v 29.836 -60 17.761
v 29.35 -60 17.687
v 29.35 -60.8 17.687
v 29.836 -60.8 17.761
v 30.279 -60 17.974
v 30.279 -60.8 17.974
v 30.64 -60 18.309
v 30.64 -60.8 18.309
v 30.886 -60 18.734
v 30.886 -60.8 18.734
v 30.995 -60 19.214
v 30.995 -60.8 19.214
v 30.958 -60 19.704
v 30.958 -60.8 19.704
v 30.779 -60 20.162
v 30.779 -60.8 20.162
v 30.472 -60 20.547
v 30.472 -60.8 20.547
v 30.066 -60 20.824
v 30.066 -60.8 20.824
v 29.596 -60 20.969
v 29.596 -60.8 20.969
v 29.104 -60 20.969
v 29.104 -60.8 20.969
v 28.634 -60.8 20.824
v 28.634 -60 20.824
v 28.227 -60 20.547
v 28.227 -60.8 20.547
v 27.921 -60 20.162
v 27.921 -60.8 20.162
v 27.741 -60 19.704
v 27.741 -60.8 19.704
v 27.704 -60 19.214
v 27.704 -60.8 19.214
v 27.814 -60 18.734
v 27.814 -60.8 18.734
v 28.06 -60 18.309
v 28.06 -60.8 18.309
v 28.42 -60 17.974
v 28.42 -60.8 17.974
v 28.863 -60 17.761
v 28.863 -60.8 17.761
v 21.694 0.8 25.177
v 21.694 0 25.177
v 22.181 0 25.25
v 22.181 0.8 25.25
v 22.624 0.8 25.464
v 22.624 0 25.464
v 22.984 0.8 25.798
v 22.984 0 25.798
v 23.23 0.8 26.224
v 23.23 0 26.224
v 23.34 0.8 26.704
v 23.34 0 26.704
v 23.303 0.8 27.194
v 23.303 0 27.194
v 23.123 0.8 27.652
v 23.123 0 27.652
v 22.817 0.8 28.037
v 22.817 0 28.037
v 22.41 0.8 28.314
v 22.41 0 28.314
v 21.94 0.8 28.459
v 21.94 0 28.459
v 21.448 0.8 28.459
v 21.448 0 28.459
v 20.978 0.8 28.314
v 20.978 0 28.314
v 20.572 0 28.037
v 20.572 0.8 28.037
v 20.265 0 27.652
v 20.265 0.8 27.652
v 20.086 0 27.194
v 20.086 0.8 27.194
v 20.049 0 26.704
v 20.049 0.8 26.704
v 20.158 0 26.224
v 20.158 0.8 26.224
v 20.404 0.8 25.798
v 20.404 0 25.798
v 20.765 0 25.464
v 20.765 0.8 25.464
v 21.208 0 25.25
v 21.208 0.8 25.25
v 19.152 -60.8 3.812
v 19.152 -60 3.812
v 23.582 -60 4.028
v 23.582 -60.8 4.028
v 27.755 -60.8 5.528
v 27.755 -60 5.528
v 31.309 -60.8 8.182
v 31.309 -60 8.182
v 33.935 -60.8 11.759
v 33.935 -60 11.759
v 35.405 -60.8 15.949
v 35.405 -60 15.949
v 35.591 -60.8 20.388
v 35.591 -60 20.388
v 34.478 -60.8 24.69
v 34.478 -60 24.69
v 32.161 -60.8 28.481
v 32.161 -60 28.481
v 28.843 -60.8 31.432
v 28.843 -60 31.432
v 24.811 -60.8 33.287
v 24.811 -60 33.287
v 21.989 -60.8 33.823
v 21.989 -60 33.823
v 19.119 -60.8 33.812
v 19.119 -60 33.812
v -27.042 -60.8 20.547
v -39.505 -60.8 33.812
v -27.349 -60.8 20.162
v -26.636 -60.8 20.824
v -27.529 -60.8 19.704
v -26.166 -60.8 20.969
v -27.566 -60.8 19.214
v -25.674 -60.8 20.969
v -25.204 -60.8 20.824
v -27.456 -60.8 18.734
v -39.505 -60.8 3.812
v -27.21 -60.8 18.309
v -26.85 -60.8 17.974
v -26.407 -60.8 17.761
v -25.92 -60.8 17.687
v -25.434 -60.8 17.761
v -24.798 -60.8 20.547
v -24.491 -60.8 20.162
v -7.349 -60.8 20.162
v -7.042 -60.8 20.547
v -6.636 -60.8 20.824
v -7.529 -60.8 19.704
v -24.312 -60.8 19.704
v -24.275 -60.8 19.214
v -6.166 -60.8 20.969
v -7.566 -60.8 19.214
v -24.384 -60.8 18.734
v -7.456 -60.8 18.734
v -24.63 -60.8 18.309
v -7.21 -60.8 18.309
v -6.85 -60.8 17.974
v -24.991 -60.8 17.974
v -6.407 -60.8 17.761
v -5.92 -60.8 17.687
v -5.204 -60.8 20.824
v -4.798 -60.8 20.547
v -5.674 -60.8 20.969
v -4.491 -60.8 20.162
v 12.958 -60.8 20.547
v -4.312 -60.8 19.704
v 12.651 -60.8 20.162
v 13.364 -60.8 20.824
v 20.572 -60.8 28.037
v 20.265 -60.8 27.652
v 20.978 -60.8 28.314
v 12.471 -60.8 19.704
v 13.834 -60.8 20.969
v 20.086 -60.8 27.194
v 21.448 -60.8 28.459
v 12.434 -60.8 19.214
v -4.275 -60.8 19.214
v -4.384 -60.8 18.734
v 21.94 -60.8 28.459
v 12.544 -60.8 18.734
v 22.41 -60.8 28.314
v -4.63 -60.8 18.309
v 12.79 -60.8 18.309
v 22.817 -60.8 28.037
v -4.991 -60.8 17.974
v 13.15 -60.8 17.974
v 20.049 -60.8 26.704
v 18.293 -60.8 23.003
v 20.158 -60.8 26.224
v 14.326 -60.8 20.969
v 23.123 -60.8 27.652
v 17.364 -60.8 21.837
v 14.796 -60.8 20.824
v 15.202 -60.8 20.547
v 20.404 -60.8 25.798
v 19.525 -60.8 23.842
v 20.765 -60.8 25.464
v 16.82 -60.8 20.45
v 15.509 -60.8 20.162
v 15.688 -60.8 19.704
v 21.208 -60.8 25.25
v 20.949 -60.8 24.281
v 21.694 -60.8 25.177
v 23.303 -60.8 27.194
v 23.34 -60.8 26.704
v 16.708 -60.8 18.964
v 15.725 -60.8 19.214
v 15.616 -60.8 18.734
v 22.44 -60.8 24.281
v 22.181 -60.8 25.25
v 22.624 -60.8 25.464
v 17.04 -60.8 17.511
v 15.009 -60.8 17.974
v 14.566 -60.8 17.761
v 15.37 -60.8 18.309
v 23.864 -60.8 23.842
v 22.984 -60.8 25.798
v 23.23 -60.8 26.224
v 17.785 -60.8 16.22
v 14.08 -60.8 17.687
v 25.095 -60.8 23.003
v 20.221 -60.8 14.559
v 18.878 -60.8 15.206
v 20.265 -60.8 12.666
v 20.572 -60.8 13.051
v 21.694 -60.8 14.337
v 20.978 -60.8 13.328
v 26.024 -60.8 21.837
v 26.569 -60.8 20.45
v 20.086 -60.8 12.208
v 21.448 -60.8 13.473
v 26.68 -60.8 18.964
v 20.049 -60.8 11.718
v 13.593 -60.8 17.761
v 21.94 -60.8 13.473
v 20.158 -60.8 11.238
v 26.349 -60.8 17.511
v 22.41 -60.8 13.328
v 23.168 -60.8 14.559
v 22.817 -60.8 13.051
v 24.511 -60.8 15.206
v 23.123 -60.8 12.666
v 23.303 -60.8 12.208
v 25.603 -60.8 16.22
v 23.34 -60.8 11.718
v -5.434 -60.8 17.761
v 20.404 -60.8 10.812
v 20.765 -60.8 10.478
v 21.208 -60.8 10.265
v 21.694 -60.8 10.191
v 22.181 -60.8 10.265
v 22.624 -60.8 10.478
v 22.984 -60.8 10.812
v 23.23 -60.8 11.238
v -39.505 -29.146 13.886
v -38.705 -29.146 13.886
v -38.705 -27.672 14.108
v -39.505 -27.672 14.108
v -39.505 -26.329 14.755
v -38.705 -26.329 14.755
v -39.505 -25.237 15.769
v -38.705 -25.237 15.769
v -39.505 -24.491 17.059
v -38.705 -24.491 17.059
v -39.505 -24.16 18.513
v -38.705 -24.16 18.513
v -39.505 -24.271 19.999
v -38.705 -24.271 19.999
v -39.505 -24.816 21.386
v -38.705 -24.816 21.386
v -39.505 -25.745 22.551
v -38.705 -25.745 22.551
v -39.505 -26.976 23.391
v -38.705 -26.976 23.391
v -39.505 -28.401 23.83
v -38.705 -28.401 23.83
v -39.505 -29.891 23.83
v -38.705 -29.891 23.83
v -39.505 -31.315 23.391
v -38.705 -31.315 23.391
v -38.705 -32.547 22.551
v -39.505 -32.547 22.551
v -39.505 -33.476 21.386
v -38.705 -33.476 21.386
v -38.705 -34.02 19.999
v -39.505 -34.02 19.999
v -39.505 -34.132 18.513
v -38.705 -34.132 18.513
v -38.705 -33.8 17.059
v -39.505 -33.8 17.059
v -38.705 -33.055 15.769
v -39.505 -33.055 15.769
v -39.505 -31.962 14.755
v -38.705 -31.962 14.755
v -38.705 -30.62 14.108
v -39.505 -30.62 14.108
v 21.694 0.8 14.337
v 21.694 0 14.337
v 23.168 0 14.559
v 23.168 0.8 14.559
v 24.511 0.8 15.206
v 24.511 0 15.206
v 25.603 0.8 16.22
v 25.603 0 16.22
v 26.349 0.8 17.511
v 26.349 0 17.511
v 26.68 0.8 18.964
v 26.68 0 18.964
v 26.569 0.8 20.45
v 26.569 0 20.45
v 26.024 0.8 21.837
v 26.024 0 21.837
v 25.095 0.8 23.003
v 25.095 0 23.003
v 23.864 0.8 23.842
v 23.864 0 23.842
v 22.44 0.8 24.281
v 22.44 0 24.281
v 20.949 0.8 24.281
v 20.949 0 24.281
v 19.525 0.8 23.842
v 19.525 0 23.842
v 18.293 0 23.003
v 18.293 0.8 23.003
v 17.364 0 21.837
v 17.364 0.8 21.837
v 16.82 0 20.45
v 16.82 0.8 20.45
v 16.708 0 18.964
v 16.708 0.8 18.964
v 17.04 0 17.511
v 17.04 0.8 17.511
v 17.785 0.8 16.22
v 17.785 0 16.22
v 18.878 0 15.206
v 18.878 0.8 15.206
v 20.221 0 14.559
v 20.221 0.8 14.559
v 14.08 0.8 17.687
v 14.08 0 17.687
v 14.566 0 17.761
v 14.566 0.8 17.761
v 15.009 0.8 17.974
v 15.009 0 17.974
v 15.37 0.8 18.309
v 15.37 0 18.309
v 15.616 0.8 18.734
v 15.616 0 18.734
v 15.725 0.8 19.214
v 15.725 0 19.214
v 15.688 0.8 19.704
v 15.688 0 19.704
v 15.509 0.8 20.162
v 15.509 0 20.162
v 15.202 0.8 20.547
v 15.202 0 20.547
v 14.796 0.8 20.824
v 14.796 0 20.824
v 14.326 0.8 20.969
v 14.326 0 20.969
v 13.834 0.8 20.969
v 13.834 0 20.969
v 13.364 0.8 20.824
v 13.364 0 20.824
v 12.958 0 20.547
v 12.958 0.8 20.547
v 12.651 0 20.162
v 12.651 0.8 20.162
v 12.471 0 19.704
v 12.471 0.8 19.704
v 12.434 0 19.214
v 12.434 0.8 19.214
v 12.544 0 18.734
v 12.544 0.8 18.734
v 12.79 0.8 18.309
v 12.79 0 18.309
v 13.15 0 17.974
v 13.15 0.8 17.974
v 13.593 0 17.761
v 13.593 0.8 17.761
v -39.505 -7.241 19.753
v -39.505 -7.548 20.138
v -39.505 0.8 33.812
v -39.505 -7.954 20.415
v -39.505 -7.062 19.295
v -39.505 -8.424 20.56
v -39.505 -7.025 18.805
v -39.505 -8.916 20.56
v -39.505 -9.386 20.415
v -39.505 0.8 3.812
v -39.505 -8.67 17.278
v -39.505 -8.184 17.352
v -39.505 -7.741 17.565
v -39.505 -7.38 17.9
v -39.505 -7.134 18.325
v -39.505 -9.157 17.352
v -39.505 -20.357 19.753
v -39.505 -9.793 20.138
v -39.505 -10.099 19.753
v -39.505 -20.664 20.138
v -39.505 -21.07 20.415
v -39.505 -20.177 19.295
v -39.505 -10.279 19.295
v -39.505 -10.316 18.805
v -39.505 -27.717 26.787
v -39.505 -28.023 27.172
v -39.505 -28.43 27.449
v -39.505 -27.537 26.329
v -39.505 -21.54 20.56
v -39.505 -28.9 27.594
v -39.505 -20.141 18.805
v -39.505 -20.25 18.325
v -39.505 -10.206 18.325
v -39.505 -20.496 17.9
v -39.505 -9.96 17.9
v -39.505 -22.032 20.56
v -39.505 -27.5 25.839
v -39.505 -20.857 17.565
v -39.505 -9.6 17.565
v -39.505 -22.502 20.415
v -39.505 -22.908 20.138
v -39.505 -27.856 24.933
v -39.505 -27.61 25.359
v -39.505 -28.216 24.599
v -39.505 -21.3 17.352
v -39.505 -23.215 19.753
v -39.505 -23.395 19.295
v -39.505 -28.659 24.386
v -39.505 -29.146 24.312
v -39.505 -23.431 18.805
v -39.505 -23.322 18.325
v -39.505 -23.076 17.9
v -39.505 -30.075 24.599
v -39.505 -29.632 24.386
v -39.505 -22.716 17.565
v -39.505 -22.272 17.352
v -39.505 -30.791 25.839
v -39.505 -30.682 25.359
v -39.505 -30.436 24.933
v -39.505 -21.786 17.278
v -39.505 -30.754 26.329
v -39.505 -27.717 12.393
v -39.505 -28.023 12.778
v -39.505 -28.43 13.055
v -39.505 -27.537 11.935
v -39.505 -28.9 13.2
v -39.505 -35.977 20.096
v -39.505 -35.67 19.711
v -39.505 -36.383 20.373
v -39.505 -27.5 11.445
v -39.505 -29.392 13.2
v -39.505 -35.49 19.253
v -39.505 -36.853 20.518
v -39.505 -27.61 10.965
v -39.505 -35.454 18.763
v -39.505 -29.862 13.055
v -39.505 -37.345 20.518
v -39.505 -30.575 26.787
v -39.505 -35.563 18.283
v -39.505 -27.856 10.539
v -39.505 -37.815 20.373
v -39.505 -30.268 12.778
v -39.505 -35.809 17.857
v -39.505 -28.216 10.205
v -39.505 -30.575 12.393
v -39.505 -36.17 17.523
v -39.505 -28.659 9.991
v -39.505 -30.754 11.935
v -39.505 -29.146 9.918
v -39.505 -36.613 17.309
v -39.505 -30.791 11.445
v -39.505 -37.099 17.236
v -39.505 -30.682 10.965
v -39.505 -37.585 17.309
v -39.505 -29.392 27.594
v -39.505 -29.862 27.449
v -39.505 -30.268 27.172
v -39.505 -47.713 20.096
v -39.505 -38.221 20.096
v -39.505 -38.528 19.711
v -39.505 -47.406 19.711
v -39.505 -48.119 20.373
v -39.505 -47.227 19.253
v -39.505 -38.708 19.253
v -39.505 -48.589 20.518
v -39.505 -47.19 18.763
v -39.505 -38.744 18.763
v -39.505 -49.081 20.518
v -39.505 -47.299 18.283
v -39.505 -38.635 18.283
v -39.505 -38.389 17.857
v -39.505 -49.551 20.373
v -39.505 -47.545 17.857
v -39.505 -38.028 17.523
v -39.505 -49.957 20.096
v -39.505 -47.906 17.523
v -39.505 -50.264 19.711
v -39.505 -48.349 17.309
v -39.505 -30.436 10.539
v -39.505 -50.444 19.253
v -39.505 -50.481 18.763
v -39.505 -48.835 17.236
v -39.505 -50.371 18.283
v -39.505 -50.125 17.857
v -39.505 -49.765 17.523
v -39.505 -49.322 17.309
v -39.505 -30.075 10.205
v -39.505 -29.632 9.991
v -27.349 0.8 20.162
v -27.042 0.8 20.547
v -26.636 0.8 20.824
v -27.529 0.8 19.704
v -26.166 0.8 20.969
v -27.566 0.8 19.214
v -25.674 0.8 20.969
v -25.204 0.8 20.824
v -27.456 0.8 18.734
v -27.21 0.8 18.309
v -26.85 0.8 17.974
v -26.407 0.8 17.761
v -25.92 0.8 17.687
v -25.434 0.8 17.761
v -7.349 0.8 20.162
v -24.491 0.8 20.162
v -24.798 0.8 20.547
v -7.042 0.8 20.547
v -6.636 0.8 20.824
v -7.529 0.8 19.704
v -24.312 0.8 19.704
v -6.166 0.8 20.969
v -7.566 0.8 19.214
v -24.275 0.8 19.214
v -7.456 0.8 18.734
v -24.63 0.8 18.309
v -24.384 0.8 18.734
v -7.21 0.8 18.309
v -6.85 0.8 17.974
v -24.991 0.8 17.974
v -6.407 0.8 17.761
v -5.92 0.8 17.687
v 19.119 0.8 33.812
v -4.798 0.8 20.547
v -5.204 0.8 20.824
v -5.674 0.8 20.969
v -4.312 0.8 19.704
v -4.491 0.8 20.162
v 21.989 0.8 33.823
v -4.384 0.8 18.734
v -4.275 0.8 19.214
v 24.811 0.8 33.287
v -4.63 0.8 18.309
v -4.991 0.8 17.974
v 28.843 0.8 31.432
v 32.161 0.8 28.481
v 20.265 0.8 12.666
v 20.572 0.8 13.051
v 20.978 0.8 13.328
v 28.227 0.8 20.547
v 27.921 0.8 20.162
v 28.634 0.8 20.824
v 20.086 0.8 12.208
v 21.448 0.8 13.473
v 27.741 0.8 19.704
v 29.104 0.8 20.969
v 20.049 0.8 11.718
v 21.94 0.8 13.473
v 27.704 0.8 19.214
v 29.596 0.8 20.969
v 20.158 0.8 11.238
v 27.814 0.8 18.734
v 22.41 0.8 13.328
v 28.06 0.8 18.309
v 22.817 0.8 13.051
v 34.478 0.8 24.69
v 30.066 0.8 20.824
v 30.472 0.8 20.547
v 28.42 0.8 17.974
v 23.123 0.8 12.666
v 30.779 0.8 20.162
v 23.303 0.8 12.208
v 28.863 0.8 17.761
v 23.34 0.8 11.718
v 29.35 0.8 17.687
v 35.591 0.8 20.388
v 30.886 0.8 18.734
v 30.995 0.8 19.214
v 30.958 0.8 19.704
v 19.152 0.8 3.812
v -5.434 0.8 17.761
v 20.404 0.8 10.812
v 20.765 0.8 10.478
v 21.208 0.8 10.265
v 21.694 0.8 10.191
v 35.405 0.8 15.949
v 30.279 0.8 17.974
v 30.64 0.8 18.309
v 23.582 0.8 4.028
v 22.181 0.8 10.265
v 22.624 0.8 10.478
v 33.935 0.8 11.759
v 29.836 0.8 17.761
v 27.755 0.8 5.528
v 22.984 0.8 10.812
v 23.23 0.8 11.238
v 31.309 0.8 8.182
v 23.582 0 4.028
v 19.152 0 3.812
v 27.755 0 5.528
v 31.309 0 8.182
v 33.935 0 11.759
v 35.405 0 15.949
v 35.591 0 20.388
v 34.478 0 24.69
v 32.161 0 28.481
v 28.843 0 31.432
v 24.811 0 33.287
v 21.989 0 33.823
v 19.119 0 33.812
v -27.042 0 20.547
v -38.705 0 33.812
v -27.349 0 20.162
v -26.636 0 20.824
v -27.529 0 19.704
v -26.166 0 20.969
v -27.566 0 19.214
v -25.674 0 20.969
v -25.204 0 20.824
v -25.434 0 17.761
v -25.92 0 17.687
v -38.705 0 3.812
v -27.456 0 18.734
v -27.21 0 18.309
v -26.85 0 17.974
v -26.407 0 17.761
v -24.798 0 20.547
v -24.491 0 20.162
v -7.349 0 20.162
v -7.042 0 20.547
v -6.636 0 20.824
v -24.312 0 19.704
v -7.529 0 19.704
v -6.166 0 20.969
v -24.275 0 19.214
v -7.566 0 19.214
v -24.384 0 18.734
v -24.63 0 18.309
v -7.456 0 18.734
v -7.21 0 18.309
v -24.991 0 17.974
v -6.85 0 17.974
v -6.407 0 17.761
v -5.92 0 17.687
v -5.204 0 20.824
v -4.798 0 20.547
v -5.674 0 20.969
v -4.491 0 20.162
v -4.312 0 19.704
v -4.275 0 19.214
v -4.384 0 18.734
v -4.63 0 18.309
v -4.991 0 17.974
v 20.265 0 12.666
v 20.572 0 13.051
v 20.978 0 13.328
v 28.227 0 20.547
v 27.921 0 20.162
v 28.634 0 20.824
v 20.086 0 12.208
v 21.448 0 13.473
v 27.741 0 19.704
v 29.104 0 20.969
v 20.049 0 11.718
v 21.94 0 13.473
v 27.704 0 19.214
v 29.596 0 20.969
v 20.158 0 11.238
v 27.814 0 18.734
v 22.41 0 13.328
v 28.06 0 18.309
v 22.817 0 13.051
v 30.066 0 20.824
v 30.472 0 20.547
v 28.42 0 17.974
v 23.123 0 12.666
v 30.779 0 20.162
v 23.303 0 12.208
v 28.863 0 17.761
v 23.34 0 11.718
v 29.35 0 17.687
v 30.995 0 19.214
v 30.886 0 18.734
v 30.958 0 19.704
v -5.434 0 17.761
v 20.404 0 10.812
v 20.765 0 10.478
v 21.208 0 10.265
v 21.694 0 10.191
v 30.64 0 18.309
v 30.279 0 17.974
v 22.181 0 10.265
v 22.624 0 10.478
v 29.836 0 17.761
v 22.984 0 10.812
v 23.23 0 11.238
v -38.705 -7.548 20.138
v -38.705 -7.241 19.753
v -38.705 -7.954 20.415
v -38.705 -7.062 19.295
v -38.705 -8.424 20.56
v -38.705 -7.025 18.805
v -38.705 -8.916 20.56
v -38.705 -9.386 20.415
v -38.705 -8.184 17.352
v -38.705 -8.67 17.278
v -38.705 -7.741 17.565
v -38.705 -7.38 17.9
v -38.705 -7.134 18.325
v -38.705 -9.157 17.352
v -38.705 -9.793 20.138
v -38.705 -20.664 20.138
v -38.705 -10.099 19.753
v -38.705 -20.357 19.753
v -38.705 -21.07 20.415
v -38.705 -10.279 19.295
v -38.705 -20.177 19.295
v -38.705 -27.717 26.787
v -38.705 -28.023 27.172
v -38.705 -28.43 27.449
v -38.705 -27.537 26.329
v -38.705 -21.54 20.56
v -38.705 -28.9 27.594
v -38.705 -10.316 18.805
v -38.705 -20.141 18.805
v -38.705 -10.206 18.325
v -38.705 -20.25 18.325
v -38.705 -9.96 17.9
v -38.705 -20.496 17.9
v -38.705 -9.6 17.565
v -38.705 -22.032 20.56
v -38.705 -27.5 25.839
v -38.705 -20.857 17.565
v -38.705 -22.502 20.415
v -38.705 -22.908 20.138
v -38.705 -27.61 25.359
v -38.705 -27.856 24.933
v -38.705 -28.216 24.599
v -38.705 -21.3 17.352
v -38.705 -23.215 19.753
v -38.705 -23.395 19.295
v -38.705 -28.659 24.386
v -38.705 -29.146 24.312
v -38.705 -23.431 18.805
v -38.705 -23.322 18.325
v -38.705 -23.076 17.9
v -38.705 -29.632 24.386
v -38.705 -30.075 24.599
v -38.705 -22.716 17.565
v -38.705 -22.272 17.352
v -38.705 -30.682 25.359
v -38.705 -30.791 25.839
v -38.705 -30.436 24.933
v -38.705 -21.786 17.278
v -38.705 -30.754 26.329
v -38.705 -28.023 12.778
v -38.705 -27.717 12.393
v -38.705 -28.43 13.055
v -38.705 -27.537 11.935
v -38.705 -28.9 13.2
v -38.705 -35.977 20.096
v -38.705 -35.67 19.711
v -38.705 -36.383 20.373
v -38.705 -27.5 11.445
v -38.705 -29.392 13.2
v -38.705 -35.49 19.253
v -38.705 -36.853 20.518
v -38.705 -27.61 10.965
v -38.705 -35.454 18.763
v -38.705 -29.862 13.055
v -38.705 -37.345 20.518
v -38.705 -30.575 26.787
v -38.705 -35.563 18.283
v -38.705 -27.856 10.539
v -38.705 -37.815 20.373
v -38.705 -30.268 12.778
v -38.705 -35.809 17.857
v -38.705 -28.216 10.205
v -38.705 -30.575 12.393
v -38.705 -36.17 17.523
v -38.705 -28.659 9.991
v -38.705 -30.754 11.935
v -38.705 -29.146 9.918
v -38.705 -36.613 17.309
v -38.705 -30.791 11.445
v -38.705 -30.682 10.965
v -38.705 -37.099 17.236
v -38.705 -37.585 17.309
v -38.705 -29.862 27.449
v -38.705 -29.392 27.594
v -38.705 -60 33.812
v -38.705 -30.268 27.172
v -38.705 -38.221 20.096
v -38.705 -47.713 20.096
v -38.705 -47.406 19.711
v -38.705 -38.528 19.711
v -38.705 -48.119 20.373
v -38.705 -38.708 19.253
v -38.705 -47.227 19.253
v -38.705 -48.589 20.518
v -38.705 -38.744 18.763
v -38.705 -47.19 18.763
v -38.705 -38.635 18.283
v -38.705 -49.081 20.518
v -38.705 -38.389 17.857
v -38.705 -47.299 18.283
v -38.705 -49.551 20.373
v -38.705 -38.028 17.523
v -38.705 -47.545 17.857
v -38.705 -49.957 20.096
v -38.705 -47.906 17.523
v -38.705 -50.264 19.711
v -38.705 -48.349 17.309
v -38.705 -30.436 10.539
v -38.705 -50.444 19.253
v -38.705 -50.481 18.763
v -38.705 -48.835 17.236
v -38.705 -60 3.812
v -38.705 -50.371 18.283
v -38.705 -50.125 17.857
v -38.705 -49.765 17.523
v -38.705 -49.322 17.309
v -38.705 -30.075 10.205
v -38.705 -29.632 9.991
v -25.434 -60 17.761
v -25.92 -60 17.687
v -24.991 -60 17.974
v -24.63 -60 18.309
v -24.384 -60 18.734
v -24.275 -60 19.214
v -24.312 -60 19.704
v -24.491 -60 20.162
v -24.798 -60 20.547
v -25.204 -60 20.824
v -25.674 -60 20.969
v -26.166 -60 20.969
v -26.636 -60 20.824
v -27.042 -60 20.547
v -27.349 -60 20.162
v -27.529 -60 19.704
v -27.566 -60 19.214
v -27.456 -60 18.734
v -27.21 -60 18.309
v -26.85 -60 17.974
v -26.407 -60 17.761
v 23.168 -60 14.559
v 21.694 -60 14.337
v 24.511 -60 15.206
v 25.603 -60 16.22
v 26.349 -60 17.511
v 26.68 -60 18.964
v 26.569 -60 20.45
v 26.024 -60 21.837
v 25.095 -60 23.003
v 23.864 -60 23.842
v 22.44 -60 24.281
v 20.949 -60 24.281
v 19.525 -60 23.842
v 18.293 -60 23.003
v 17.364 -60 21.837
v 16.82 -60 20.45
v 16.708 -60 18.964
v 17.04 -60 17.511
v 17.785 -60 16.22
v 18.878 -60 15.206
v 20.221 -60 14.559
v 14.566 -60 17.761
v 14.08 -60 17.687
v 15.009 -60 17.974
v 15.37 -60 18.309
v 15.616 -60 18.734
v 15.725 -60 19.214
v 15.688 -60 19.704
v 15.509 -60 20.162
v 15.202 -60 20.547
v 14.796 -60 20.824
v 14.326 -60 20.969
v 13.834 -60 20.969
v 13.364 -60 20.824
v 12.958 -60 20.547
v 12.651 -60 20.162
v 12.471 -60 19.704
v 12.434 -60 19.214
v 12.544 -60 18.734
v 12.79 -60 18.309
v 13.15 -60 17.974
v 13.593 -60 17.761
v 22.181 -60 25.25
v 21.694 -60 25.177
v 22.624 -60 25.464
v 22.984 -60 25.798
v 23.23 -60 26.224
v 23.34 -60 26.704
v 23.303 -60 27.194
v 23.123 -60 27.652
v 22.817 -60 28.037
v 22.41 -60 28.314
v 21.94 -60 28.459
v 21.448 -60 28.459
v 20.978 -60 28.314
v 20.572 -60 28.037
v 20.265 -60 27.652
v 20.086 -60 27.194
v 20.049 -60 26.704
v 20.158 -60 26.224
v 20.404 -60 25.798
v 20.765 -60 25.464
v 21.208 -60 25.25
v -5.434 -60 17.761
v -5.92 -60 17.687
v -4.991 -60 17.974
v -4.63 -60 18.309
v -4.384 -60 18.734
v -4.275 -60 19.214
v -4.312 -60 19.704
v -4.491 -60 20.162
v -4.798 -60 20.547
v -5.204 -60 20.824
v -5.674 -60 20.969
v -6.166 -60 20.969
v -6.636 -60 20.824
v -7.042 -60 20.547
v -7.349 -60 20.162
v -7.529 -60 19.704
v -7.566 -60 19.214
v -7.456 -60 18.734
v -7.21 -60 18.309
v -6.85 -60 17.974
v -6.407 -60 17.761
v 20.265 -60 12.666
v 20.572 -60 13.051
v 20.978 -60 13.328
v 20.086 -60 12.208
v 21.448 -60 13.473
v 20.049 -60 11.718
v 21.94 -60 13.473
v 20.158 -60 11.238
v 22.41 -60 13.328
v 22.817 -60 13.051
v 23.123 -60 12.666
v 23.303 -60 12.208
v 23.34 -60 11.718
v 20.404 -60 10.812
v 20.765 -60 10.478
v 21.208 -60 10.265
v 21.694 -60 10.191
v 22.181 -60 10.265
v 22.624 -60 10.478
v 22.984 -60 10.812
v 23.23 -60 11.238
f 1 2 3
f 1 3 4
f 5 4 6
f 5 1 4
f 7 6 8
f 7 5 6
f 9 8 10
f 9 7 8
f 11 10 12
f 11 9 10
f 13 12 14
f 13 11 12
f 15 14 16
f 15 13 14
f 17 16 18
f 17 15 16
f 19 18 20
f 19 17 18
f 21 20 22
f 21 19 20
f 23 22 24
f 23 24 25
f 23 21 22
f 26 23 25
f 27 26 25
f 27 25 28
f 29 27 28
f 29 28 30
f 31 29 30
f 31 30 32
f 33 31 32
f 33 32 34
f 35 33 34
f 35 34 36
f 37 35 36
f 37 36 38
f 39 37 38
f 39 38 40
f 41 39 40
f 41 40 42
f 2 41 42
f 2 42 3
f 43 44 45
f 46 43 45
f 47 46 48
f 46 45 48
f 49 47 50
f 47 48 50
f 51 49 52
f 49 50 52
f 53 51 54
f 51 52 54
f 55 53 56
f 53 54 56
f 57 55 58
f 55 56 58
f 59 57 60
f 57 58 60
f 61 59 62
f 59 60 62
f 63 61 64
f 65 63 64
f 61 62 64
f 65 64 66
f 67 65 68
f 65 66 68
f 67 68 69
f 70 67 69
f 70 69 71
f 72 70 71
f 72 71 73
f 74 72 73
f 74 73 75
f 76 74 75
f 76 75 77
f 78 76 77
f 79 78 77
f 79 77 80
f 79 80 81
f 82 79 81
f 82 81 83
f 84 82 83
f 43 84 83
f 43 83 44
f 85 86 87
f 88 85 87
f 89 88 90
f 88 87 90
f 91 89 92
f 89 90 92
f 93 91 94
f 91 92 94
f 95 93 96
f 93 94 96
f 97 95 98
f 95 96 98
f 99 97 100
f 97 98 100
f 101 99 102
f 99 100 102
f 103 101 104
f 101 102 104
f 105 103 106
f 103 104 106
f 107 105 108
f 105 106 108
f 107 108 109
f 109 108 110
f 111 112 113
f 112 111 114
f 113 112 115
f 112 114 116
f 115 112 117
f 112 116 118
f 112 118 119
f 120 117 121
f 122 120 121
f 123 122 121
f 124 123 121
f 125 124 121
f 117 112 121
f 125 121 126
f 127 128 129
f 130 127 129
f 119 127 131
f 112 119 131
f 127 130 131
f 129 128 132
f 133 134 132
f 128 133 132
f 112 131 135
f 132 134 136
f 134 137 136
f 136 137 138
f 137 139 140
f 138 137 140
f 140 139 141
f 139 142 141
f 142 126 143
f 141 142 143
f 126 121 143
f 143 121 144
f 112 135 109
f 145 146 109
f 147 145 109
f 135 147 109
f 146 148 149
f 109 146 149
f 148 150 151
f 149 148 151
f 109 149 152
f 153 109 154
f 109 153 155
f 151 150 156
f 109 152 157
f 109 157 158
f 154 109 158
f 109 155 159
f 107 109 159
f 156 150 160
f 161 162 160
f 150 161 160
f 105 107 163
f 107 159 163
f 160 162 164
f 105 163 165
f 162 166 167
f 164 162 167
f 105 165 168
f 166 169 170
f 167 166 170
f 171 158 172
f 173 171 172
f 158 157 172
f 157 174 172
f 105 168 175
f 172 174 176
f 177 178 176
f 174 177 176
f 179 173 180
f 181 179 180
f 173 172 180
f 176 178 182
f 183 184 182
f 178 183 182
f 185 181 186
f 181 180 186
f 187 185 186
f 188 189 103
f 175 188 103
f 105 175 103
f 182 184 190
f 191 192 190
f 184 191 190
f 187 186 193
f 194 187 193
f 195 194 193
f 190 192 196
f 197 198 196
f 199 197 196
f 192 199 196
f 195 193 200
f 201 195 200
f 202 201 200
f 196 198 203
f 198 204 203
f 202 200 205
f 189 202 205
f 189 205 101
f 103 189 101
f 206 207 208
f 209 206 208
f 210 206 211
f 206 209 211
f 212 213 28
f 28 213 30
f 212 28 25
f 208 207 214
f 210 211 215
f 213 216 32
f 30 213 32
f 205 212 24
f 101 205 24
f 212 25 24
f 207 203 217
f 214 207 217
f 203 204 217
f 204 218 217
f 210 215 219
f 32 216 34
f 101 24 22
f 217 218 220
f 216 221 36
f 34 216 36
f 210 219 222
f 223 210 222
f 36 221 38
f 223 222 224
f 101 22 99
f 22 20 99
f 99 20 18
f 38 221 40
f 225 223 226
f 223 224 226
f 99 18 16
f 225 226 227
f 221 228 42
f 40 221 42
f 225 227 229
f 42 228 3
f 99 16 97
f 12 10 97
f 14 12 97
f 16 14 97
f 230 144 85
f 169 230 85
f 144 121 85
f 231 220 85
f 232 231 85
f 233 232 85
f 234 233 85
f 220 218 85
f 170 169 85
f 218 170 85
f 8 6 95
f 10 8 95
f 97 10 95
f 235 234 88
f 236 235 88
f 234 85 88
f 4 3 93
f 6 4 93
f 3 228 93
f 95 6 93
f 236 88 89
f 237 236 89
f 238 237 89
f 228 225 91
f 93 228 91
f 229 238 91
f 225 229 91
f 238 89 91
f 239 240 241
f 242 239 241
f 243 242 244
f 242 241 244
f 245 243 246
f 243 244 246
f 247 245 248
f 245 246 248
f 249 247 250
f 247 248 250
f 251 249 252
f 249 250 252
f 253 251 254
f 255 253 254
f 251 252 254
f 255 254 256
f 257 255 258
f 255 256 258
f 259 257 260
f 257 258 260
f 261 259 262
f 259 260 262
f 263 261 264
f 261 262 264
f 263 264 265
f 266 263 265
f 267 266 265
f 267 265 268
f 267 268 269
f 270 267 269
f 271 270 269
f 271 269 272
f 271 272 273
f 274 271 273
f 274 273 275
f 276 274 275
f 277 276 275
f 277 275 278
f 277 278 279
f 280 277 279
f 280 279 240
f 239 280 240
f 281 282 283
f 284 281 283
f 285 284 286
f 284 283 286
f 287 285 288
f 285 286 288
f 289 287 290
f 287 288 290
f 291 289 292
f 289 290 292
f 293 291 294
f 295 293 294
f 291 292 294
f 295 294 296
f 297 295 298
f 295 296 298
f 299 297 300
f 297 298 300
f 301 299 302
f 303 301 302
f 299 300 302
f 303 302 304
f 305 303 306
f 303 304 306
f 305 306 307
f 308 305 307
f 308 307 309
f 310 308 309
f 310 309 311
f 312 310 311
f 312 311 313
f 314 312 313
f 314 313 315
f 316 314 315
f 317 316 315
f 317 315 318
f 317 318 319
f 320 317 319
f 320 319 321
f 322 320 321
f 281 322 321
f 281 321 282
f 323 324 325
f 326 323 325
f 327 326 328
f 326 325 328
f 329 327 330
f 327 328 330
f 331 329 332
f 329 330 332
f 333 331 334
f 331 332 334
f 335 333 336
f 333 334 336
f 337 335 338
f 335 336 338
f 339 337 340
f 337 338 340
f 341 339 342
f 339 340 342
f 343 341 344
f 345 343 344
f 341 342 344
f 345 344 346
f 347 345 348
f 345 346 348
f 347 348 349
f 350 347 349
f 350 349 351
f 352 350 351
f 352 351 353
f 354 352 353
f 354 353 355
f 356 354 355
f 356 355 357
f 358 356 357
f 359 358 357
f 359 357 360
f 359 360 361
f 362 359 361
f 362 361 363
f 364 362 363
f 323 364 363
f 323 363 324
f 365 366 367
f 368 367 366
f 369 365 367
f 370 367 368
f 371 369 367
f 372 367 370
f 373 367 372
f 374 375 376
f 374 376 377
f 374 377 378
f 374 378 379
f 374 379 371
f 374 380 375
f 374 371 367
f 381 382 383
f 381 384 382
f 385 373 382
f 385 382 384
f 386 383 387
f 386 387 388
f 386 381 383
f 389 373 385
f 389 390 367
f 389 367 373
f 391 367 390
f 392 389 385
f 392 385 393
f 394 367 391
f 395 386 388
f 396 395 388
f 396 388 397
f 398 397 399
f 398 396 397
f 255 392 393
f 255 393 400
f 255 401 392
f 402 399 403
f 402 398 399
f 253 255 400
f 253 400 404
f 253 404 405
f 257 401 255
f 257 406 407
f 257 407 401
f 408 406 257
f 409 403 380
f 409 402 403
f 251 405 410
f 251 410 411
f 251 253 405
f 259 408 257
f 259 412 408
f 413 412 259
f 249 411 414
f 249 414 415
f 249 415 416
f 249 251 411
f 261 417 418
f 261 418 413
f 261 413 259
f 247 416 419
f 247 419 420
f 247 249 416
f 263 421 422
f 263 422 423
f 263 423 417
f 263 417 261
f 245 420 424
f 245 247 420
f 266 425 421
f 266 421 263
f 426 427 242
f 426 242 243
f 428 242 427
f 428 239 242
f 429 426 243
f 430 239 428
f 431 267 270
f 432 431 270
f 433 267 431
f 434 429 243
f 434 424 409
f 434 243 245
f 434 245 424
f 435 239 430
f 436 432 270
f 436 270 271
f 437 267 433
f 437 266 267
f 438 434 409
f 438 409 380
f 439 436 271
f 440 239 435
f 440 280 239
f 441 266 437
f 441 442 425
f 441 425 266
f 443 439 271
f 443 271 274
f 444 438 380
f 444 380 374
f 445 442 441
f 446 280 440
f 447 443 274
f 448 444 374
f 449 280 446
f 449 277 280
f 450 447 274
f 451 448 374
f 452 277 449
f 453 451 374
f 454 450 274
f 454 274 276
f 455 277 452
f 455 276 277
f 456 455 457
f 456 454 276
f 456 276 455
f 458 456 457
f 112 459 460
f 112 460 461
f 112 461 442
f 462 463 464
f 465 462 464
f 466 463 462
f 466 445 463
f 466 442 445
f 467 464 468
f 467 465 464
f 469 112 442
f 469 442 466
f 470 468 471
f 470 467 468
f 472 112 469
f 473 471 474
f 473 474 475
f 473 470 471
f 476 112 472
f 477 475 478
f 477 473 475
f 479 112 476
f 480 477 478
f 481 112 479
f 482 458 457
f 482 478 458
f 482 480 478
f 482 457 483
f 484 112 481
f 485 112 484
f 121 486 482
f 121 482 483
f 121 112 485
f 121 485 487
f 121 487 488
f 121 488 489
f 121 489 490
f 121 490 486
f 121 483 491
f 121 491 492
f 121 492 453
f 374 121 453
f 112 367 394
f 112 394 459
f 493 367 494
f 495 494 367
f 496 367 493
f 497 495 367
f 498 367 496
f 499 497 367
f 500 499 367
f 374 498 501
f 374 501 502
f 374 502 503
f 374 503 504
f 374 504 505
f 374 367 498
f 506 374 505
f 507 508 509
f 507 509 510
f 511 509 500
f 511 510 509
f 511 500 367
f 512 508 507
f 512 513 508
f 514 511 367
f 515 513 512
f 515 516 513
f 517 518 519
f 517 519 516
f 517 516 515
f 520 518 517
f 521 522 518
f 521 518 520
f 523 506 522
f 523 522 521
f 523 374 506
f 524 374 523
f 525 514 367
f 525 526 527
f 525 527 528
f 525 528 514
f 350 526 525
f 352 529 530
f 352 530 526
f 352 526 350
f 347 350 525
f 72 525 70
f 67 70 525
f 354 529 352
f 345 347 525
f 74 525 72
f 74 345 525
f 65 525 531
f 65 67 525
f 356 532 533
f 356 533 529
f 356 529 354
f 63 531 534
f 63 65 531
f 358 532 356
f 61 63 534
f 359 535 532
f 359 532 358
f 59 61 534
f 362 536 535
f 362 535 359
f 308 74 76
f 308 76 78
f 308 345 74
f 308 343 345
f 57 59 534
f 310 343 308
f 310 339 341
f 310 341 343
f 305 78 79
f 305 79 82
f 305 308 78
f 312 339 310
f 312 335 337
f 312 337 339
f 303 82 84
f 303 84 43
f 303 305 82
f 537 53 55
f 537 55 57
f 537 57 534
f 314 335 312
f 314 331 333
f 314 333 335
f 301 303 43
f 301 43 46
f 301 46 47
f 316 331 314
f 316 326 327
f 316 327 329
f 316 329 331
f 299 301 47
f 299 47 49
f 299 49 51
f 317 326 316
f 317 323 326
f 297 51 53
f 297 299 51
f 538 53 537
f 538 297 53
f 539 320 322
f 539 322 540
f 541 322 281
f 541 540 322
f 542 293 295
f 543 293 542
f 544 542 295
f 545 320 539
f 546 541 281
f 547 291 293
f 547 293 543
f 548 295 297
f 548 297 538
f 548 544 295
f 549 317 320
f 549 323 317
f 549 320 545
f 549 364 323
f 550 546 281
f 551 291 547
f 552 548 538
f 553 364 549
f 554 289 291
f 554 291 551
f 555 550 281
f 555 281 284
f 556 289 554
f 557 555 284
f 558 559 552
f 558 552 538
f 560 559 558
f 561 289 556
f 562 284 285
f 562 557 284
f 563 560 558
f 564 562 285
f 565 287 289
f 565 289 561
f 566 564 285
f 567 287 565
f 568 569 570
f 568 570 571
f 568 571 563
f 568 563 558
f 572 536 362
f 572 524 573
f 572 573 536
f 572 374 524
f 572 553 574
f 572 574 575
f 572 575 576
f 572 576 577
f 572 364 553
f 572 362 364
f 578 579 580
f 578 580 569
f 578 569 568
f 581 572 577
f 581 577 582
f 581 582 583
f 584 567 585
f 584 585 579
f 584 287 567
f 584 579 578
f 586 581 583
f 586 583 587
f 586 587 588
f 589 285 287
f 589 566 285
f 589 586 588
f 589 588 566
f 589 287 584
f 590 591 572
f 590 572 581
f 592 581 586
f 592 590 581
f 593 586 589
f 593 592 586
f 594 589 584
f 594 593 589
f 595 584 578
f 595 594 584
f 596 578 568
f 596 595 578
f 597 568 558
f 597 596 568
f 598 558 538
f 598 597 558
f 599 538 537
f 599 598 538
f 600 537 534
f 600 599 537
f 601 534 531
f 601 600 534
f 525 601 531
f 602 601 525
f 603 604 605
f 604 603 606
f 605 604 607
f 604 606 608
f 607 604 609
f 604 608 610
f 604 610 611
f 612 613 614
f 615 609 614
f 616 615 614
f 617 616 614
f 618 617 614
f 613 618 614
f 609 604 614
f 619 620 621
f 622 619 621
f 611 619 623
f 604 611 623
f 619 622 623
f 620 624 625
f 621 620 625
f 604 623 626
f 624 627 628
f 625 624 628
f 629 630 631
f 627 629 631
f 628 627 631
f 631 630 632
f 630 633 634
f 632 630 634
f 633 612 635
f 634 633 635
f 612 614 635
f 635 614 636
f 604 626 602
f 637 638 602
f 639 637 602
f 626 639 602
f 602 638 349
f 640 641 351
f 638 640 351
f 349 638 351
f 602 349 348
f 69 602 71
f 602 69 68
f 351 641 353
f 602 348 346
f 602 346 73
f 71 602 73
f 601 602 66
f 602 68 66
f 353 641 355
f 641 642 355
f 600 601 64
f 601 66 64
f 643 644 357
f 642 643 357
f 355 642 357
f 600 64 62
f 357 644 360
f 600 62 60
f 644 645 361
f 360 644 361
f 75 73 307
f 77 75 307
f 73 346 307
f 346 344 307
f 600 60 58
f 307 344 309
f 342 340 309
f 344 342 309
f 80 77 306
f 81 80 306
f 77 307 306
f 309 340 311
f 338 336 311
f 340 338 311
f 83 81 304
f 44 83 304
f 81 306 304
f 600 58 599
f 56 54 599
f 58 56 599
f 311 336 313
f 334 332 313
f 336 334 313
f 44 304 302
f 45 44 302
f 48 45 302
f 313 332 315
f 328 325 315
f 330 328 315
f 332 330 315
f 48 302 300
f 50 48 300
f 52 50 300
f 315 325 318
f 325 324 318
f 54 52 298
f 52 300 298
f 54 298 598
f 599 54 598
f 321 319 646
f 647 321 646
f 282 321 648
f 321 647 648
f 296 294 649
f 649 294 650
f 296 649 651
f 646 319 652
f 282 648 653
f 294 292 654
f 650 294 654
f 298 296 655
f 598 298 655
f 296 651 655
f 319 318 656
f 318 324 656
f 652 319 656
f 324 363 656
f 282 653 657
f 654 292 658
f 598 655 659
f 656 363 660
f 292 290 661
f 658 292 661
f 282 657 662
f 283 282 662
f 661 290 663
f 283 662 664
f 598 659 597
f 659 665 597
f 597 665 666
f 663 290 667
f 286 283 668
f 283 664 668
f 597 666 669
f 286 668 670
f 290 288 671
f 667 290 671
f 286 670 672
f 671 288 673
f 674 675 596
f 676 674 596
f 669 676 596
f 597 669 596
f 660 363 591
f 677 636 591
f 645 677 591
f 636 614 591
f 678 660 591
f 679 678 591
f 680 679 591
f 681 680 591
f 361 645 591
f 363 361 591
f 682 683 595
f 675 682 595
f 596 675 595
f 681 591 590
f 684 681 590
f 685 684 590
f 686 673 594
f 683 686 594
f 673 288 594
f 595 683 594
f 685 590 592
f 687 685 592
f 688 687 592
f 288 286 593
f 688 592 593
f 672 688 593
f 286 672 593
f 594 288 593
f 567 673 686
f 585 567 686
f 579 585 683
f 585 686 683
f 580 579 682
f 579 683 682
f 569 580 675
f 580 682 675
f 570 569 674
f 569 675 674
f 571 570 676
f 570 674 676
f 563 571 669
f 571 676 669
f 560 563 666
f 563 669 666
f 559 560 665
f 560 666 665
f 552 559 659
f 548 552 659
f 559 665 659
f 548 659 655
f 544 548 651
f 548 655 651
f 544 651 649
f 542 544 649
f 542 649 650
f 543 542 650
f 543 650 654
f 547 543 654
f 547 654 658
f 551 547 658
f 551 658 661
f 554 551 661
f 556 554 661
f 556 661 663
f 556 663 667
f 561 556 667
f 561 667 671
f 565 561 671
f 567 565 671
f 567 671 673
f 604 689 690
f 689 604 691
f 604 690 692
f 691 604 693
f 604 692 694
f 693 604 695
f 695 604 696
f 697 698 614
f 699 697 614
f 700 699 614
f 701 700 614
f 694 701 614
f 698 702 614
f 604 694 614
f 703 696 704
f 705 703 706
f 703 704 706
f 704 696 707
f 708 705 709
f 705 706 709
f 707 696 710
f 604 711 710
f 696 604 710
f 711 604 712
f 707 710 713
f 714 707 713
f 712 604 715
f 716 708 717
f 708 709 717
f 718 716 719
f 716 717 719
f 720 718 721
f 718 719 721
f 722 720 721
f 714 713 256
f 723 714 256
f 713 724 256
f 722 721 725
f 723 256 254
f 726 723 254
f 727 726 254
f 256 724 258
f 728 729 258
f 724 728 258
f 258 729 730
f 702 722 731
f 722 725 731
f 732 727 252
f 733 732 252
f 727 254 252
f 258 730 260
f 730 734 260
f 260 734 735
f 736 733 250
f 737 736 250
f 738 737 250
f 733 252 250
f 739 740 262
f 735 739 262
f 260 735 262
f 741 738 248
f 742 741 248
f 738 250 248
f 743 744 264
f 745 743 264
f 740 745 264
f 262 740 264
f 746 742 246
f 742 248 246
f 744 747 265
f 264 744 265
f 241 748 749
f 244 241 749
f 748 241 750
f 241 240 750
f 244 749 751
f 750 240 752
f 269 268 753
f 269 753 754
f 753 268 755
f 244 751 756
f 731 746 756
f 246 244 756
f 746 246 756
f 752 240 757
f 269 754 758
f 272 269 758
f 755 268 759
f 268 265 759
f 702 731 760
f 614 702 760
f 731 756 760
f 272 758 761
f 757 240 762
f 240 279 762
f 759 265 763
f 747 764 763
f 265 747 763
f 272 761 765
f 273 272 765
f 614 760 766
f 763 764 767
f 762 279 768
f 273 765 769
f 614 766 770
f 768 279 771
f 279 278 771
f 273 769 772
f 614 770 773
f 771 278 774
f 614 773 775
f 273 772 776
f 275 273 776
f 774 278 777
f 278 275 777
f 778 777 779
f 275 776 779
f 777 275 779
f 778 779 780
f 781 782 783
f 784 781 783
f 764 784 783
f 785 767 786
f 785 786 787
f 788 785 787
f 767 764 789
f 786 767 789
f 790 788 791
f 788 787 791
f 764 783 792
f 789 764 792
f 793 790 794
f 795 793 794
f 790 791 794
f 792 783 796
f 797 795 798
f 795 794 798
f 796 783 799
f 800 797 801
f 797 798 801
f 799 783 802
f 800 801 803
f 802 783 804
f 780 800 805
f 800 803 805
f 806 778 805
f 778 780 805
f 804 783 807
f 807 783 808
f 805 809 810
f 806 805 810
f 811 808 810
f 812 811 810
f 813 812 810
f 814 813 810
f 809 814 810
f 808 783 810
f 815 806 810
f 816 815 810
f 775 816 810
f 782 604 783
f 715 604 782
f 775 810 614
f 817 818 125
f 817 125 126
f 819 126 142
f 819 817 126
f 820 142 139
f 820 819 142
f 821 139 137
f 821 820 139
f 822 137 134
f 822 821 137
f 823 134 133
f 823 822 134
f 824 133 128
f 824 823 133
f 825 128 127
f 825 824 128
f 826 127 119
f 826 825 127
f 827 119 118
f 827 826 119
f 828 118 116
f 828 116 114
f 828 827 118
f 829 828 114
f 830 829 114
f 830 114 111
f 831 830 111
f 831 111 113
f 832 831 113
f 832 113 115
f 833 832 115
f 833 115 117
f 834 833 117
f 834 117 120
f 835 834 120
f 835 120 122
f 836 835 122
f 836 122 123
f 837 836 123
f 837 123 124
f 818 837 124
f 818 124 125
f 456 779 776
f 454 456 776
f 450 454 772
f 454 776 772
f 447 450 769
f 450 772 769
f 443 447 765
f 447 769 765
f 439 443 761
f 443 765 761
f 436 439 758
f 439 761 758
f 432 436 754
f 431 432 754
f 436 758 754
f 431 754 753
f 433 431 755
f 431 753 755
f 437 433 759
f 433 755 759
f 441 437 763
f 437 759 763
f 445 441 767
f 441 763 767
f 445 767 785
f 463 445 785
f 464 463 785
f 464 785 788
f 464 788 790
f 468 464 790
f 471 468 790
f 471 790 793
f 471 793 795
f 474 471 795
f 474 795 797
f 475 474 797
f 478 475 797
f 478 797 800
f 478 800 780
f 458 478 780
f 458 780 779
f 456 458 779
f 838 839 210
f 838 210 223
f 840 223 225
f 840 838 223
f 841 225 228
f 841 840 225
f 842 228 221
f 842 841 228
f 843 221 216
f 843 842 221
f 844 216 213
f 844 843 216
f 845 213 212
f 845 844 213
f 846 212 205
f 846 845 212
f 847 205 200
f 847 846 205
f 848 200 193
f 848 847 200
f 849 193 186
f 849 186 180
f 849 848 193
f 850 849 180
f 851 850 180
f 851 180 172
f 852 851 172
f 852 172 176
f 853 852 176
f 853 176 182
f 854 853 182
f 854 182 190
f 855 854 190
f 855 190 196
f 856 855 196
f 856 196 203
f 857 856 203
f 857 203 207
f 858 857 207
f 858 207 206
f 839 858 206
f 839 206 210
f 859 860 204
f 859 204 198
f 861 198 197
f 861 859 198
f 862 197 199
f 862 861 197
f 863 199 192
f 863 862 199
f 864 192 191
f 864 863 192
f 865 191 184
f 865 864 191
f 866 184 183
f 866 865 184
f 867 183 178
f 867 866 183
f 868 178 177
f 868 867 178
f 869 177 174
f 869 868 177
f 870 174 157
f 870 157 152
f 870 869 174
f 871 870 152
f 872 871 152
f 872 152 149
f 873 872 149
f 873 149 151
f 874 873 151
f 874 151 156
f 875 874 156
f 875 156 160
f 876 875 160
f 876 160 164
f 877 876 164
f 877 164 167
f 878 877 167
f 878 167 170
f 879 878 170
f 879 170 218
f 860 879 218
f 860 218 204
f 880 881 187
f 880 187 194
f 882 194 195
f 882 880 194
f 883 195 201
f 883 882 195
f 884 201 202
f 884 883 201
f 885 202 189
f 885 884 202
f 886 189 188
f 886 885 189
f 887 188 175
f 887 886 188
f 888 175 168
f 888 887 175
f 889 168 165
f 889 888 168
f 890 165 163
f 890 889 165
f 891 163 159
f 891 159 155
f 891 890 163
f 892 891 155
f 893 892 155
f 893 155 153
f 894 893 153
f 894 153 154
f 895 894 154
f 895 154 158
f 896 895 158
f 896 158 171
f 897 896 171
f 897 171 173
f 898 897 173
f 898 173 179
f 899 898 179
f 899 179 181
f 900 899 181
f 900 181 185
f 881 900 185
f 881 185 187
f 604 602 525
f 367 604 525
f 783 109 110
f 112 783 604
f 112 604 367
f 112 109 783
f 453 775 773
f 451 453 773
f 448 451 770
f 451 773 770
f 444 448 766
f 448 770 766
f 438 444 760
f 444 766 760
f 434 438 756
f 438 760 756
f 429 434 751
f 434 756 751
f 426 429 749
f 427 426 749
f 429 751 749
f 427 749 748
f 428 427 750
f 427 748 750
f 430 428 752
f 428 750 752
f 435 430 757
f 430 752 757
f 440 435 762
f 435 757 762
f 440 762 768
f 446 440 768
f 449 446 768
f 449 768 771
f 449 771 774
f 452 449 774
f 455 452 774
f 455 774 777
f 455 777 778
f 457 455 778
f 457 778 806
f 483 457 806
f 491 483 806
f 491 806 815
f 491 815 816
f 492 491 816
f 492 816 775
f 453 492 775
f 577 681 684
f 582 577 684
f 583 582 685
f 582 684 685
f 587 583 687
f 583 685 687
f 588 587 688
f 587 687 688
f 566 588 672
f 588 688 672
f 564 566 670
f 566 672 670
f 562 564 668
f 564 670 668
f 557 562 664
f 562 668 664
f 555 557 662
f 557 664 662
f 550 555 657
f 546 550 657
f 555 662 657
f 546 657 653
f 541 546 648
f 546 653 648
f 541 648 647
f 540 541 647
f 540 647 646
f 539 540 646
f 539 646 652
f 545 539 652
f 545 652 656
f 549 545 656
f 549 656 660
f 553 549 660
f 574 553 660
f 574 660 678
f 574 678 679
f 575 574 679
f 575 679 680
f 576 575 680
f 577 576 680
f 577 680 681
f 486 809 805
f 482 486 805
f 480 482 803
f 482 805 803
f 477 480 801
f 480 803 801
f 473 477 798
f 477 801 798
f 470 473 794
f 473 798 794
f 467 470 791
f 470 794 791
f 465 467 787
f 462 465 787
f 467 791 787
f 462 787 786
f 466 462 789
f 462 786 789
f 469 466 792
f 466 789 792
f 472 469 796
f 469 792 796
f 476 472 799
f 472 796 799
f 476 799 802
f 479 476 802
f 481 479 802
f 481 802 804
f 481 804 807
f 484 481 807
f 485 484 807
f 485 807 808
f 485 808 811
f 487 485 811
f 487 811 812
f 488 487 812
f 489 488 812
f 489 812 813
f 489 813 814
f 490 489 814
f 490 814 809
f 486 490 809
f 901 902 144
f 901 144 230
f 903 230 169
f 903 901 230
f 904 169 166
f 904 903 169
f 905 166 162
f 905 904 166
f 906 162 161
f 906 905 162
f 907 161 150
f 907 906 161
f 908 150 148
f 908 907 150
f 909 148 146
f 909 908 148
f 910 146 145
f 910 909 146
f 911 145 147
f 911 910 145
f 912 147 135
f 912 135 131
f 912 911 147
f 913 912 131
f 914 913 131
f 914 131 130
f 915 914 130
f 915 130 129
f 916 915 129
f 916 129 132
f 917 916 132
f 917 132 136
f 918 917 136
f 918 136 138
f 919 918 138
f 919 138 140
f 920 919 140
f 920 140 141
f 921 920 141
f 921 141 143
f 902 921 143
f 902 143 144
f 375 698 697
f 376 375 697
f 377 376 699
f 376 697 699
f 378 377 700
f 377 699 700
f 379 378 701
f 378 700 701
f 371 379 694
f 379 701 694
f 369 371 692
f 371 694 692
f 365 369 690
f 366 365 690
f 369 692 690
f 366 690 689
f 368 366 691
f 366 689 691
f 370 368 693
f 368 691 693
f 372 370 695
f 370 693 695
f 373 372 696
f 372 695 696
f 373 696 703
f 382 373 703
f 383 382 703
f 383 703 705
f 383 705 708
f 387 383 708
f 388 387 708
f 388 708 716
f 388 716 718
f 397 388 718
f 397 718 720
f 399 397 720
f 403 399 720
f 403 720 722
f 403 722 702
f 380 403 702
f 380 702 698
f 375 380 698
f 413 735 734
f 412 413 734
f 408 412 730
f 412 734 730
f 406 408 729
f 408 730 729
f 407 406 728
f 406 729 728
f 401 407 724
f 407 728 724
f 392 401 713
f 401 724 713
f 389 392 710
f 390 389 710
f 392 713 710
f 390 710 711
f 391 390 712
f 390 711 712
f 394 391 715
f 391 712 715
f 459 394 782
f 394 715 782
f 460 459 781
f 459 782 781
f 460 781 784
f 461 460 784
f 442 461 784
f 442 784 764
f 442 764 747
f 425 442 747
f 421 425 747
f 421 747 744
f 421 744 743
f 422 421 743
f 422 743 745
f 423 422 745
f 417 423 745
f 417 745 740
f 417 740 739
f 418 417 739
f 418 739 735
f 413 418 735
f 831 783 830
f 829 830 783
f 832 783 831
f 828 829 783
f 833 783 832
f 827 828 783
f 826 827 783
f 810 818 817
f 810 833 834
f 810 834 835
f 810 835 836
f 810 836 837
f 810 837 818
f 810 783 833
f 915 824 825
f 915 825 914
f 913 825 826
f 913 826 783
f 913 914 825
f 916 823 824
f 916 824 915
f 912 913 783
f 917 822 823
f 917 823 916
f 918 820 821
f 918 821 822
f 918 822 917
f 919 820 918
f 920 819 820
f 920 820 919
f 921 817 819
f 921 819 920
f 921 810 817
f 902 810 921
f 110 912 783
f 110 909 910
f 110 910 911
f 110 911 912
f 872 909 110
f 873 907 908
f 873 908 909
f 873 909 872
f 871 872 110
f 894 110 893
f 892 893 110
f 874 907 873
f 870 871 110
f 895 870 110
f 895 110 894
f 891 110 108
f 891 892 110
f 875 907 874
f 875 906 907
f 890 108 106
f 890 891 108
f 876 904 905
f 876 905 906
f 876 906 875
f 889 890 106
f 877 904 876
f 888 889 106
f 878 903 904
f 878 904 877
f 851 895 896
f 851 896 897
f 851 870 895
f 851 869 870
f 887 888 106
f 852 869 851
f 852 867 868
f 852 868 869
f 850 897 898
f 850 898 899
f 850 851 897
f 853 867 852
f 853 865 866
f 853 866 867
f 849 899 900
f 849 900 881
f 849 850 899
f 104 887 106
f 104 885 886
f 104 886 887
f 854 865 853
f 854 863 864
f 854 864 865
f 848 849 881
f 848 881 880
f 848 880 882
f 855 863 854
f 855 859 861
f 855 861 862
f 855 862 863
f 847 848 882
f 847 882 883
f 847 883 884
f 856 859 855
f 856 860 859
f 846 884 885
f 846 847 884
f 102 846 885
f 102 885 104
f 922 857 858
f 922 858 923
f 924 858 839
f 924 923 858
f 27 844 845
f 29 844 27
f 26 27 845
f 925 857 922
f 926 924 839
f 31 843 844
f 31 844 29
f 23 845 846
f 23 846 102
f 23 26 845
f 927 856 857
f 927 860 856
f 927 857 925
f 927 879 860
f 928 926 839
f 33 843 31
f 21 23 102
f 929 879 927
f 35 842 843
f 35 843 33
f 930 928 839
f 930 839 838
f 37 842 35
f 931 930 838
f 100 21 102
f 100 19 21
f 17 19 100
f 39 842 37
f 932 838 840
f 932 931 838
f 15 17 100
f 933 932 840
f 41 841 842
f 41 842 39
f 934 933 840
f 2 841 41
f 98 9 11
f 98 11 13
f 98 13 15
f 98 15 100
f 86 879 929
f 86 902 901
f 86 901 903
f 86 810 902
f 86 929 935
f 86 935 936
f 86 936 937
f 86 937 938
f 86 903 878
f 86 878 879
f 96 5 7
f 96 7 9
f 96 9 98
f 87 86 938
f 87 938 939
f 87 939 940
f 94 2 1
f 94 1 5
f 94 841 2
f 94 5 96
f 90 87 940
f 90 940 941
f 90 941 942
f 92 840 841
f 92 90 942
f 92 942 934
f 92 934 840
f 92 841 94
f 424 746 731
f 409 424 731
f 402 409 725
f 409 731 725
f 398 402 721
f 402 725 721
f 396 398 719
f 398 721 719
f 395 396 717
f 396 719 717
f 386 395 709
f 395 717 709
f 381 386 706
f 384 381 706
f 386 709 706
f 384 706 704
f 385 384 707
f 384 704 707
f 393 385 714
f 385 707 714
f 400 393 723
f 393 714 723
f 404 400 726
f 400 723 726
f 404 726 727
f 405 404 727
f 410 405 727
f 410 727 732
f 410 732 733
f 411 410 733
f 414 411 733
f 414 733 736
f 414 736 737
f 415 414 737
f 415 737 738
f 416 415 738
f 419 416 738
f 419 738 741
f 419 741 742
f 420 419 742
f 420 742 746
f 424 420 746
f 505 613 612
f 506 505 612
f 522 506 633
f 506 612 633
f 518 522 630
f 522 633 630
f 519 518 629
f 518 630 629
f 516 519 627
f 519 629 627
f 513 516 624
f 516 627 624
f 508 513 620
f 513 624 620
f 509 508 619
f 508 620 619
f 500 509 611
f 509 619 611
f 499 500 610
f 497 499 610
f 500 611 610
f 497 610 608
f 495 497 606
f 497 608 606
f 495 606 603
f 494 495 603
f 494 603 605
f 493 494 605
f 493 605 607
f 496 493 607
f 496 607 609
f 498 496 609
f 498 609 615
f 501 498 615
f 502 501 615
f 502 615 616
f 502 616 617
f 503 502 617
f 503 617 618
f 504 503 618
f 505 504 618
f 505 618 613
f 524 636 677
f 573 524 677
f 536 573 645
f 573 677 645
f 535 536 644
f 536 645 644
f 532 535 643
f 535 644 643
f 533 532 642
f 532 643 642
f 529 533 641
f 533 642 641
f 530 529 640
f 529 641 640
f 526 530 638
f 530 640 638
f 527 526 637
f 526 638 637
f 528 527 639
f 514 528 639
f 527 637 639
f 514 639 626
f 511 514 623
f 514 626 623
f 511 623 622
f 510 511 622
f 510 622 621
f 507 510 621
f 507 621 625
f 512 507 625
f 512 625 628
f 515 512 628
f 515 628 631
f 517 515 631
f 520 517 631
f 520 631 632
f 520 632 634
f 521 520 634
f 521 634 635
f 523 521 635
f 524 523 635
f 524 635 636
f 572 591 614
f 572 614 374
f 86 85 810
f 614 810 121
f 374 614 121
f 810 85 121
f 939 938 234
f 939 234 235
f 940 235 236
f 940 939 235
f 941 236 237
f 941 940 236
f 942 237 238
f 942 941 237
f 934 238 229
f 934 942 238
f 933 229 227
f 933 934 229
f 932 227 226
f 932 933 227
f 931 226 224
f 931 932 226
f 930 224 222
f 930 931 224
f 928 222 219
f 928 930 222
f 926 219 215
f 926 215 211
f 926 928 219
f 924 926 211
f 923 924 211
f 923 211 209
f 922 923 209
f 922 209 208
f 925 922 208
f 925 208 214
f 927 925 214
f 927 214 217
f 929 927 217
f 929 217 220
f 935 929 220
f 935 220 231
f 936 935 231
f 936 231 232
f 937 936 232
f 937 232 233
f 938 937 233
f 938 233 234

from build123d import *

# Parameters (mm, degrees)
SKETCH1_W           = 60
SKETCH1_H           = 30
BOSS_EXTRUDE3_DEPTH = 0.8
SKETCH4_W           = 0.8
SKETCH4_H           = 30
BOSS_EXTRUDE5_DEPTH = 30
SKETCH5_RX          = 15.076743355
SKETCH5_RY          = 15.045734075
BOSS_EXTRUDE6_DEPTH = 0.8
SKETCH6_R           = 5
SKETCH6_R_2         = 1.65
CUT_EXTRUDE2_DEPTH  = 10
SKETCH7_R           = 5
SKETCH7_R_2         = 1.65
CUT_EXTRUDE3_DEPTH  = 10


with BuildPart() as part:
    # Sketch1 → Boss-Extrude3 (new body)
    with BuildSketch(Plane(origin=(0, 0, 0), x_dir=(1, 0, 0), z_dir=(0, 1, 0))):
        with Locations((-9.504950495, -18.811881188)):
            Rectangle(SKETCH1_W, SKETCH1_H)
    extrude(amount=BOSS_EXTRUDE3_DEPTH)

    # Sketch4 → Boss-Extrude5 (add)
    with BuildSketch(Plane(origin=(0, 0, 0), x_dir=(-1, 0, 0), z_dir=(0, -1, 0))):
        with Locations((39.104950495, -18.811881188)):
            Rectangle(SKETCH4_W, SKETCH4_H)
    extrude(amount=BOSS_EXTRUDE5_DEPTH)

    # Sketch5 → Boss-Extrude6 (add)
    with BuildSketch(Plane(origin=(0, 0, 0), x_dir=(-1, 0, 0), z_dir=(0, -1, 0))):
        with Locations(Location((-20.627248494, -18.811881188), (0, 0, -73.484297411))):
            Ellipse(SKETCH5_RX, SKETCH5_RY)
    extrude(amount=-BOSS_EXTRUDE6_DEPTH)

    # Sketch6 → Cut-Extrude2 (cut)
    with BuildSketch(Plane(origin=(0, 0, 0), x_dir=(-1, 0, 0), z_dir=(0, -1, 0))):
        with Locations(Location((-21.694340642, -19.337305604, 0), (0, 0, 90))):
            Circle(SKETCH6_R)
        with Locations(Location((-21.694340642, -26.827036376, 0), (0, 0, 90))):
            Circle(SKETCH6_R_2)
        with Locations(Location((-29.349644864, -19.337305604, 0), (0, 0, 90))):
            Circle(SKETCH6_R_2)
        with Locations(Location((-21.694340642, -11.841250602, 0), (0, 0, 90))):
            Circle(SKETCH6_R_2)
        with Locations(Location((-14.079805527, -19.337305604, 0), (0, 0, 90))):
            Circle(SKETCH6_R_2)
        with Locations(Location((5.920194473, -19.337305604, 0), (0, 0, 90))):
            Circle(SKETCH6_R_2)
        with Locations(Location((25.920194473, -19.337305604, 0), (0, 0, 90))):
            Circle(SKETCH6_R_2)
        with Locations((-30.261708207, -582.328950324)):
            Circle(SKETCH6_R)
        with Locations((-37.91701243, -582.328950324)):
            Circle(SKETCH6_R_2)
        with Locations((-30.261708207, -574.832895322)):
            Circle(SKETCH6_R_2)
        with Locations((-22.647173092, -582.328950324)):
            Circle(SKETCH6_R_2)
        with Locations((-2.647173092, -582.328950324)):
            Circle(SKETCH6_R_2)
        with Locations((17.352826908, -582.328950324)):
            Circle(SKETCH6_R_2)
    extrude(amount=-CUT_EXTRUDE2_DEPTH, mode=Mode.SUBTRACT)

    # Mirror1: part across plane


with BuildPart() as part_1:
    add(part.part)
    add(part.part.mirror(Plane(origin=(0, -30, 0), x_dir=(0, 0, 1), z_dir=(0, -1, 0))))

    # Sketch7 → Cut-Extrude3 (cut)
    with BuildSketch(Plane(origin=(-38.704950495, 0, 0), x_dir=(0, 0, -1), z_dir=(1, 0, 0))):
        with Locations((-18.886165754, -29.145727498)):
            Circle(SKETCH7_R)
        with Locations((-18.928301582, -21.786074369)):
            Circle(SKETCH7_R_2)
        with Locations((-11.568184027, -29.145727498)):
            Circle(SKETCH7_R_2)
        with Locations((-18.886165754, -37.098993576)):
            Circle(SKETCH7_R_2)
        with Locations((-25.962216175, -29.145727498)):
            Circle(SKETCH7_R_2)
        with Locations((-18.928301582, -8.670402783)):
            Circle(SKETCH7_R_2)
        with Locations((-18.886165754, -48.835170272)):
            Circle(SKETCH7_R_2)
    extrude(amount=-CUT_EXTRUDE3_DEPTH, mode=Mode.SUBTRACT)


solid = part_1.part
